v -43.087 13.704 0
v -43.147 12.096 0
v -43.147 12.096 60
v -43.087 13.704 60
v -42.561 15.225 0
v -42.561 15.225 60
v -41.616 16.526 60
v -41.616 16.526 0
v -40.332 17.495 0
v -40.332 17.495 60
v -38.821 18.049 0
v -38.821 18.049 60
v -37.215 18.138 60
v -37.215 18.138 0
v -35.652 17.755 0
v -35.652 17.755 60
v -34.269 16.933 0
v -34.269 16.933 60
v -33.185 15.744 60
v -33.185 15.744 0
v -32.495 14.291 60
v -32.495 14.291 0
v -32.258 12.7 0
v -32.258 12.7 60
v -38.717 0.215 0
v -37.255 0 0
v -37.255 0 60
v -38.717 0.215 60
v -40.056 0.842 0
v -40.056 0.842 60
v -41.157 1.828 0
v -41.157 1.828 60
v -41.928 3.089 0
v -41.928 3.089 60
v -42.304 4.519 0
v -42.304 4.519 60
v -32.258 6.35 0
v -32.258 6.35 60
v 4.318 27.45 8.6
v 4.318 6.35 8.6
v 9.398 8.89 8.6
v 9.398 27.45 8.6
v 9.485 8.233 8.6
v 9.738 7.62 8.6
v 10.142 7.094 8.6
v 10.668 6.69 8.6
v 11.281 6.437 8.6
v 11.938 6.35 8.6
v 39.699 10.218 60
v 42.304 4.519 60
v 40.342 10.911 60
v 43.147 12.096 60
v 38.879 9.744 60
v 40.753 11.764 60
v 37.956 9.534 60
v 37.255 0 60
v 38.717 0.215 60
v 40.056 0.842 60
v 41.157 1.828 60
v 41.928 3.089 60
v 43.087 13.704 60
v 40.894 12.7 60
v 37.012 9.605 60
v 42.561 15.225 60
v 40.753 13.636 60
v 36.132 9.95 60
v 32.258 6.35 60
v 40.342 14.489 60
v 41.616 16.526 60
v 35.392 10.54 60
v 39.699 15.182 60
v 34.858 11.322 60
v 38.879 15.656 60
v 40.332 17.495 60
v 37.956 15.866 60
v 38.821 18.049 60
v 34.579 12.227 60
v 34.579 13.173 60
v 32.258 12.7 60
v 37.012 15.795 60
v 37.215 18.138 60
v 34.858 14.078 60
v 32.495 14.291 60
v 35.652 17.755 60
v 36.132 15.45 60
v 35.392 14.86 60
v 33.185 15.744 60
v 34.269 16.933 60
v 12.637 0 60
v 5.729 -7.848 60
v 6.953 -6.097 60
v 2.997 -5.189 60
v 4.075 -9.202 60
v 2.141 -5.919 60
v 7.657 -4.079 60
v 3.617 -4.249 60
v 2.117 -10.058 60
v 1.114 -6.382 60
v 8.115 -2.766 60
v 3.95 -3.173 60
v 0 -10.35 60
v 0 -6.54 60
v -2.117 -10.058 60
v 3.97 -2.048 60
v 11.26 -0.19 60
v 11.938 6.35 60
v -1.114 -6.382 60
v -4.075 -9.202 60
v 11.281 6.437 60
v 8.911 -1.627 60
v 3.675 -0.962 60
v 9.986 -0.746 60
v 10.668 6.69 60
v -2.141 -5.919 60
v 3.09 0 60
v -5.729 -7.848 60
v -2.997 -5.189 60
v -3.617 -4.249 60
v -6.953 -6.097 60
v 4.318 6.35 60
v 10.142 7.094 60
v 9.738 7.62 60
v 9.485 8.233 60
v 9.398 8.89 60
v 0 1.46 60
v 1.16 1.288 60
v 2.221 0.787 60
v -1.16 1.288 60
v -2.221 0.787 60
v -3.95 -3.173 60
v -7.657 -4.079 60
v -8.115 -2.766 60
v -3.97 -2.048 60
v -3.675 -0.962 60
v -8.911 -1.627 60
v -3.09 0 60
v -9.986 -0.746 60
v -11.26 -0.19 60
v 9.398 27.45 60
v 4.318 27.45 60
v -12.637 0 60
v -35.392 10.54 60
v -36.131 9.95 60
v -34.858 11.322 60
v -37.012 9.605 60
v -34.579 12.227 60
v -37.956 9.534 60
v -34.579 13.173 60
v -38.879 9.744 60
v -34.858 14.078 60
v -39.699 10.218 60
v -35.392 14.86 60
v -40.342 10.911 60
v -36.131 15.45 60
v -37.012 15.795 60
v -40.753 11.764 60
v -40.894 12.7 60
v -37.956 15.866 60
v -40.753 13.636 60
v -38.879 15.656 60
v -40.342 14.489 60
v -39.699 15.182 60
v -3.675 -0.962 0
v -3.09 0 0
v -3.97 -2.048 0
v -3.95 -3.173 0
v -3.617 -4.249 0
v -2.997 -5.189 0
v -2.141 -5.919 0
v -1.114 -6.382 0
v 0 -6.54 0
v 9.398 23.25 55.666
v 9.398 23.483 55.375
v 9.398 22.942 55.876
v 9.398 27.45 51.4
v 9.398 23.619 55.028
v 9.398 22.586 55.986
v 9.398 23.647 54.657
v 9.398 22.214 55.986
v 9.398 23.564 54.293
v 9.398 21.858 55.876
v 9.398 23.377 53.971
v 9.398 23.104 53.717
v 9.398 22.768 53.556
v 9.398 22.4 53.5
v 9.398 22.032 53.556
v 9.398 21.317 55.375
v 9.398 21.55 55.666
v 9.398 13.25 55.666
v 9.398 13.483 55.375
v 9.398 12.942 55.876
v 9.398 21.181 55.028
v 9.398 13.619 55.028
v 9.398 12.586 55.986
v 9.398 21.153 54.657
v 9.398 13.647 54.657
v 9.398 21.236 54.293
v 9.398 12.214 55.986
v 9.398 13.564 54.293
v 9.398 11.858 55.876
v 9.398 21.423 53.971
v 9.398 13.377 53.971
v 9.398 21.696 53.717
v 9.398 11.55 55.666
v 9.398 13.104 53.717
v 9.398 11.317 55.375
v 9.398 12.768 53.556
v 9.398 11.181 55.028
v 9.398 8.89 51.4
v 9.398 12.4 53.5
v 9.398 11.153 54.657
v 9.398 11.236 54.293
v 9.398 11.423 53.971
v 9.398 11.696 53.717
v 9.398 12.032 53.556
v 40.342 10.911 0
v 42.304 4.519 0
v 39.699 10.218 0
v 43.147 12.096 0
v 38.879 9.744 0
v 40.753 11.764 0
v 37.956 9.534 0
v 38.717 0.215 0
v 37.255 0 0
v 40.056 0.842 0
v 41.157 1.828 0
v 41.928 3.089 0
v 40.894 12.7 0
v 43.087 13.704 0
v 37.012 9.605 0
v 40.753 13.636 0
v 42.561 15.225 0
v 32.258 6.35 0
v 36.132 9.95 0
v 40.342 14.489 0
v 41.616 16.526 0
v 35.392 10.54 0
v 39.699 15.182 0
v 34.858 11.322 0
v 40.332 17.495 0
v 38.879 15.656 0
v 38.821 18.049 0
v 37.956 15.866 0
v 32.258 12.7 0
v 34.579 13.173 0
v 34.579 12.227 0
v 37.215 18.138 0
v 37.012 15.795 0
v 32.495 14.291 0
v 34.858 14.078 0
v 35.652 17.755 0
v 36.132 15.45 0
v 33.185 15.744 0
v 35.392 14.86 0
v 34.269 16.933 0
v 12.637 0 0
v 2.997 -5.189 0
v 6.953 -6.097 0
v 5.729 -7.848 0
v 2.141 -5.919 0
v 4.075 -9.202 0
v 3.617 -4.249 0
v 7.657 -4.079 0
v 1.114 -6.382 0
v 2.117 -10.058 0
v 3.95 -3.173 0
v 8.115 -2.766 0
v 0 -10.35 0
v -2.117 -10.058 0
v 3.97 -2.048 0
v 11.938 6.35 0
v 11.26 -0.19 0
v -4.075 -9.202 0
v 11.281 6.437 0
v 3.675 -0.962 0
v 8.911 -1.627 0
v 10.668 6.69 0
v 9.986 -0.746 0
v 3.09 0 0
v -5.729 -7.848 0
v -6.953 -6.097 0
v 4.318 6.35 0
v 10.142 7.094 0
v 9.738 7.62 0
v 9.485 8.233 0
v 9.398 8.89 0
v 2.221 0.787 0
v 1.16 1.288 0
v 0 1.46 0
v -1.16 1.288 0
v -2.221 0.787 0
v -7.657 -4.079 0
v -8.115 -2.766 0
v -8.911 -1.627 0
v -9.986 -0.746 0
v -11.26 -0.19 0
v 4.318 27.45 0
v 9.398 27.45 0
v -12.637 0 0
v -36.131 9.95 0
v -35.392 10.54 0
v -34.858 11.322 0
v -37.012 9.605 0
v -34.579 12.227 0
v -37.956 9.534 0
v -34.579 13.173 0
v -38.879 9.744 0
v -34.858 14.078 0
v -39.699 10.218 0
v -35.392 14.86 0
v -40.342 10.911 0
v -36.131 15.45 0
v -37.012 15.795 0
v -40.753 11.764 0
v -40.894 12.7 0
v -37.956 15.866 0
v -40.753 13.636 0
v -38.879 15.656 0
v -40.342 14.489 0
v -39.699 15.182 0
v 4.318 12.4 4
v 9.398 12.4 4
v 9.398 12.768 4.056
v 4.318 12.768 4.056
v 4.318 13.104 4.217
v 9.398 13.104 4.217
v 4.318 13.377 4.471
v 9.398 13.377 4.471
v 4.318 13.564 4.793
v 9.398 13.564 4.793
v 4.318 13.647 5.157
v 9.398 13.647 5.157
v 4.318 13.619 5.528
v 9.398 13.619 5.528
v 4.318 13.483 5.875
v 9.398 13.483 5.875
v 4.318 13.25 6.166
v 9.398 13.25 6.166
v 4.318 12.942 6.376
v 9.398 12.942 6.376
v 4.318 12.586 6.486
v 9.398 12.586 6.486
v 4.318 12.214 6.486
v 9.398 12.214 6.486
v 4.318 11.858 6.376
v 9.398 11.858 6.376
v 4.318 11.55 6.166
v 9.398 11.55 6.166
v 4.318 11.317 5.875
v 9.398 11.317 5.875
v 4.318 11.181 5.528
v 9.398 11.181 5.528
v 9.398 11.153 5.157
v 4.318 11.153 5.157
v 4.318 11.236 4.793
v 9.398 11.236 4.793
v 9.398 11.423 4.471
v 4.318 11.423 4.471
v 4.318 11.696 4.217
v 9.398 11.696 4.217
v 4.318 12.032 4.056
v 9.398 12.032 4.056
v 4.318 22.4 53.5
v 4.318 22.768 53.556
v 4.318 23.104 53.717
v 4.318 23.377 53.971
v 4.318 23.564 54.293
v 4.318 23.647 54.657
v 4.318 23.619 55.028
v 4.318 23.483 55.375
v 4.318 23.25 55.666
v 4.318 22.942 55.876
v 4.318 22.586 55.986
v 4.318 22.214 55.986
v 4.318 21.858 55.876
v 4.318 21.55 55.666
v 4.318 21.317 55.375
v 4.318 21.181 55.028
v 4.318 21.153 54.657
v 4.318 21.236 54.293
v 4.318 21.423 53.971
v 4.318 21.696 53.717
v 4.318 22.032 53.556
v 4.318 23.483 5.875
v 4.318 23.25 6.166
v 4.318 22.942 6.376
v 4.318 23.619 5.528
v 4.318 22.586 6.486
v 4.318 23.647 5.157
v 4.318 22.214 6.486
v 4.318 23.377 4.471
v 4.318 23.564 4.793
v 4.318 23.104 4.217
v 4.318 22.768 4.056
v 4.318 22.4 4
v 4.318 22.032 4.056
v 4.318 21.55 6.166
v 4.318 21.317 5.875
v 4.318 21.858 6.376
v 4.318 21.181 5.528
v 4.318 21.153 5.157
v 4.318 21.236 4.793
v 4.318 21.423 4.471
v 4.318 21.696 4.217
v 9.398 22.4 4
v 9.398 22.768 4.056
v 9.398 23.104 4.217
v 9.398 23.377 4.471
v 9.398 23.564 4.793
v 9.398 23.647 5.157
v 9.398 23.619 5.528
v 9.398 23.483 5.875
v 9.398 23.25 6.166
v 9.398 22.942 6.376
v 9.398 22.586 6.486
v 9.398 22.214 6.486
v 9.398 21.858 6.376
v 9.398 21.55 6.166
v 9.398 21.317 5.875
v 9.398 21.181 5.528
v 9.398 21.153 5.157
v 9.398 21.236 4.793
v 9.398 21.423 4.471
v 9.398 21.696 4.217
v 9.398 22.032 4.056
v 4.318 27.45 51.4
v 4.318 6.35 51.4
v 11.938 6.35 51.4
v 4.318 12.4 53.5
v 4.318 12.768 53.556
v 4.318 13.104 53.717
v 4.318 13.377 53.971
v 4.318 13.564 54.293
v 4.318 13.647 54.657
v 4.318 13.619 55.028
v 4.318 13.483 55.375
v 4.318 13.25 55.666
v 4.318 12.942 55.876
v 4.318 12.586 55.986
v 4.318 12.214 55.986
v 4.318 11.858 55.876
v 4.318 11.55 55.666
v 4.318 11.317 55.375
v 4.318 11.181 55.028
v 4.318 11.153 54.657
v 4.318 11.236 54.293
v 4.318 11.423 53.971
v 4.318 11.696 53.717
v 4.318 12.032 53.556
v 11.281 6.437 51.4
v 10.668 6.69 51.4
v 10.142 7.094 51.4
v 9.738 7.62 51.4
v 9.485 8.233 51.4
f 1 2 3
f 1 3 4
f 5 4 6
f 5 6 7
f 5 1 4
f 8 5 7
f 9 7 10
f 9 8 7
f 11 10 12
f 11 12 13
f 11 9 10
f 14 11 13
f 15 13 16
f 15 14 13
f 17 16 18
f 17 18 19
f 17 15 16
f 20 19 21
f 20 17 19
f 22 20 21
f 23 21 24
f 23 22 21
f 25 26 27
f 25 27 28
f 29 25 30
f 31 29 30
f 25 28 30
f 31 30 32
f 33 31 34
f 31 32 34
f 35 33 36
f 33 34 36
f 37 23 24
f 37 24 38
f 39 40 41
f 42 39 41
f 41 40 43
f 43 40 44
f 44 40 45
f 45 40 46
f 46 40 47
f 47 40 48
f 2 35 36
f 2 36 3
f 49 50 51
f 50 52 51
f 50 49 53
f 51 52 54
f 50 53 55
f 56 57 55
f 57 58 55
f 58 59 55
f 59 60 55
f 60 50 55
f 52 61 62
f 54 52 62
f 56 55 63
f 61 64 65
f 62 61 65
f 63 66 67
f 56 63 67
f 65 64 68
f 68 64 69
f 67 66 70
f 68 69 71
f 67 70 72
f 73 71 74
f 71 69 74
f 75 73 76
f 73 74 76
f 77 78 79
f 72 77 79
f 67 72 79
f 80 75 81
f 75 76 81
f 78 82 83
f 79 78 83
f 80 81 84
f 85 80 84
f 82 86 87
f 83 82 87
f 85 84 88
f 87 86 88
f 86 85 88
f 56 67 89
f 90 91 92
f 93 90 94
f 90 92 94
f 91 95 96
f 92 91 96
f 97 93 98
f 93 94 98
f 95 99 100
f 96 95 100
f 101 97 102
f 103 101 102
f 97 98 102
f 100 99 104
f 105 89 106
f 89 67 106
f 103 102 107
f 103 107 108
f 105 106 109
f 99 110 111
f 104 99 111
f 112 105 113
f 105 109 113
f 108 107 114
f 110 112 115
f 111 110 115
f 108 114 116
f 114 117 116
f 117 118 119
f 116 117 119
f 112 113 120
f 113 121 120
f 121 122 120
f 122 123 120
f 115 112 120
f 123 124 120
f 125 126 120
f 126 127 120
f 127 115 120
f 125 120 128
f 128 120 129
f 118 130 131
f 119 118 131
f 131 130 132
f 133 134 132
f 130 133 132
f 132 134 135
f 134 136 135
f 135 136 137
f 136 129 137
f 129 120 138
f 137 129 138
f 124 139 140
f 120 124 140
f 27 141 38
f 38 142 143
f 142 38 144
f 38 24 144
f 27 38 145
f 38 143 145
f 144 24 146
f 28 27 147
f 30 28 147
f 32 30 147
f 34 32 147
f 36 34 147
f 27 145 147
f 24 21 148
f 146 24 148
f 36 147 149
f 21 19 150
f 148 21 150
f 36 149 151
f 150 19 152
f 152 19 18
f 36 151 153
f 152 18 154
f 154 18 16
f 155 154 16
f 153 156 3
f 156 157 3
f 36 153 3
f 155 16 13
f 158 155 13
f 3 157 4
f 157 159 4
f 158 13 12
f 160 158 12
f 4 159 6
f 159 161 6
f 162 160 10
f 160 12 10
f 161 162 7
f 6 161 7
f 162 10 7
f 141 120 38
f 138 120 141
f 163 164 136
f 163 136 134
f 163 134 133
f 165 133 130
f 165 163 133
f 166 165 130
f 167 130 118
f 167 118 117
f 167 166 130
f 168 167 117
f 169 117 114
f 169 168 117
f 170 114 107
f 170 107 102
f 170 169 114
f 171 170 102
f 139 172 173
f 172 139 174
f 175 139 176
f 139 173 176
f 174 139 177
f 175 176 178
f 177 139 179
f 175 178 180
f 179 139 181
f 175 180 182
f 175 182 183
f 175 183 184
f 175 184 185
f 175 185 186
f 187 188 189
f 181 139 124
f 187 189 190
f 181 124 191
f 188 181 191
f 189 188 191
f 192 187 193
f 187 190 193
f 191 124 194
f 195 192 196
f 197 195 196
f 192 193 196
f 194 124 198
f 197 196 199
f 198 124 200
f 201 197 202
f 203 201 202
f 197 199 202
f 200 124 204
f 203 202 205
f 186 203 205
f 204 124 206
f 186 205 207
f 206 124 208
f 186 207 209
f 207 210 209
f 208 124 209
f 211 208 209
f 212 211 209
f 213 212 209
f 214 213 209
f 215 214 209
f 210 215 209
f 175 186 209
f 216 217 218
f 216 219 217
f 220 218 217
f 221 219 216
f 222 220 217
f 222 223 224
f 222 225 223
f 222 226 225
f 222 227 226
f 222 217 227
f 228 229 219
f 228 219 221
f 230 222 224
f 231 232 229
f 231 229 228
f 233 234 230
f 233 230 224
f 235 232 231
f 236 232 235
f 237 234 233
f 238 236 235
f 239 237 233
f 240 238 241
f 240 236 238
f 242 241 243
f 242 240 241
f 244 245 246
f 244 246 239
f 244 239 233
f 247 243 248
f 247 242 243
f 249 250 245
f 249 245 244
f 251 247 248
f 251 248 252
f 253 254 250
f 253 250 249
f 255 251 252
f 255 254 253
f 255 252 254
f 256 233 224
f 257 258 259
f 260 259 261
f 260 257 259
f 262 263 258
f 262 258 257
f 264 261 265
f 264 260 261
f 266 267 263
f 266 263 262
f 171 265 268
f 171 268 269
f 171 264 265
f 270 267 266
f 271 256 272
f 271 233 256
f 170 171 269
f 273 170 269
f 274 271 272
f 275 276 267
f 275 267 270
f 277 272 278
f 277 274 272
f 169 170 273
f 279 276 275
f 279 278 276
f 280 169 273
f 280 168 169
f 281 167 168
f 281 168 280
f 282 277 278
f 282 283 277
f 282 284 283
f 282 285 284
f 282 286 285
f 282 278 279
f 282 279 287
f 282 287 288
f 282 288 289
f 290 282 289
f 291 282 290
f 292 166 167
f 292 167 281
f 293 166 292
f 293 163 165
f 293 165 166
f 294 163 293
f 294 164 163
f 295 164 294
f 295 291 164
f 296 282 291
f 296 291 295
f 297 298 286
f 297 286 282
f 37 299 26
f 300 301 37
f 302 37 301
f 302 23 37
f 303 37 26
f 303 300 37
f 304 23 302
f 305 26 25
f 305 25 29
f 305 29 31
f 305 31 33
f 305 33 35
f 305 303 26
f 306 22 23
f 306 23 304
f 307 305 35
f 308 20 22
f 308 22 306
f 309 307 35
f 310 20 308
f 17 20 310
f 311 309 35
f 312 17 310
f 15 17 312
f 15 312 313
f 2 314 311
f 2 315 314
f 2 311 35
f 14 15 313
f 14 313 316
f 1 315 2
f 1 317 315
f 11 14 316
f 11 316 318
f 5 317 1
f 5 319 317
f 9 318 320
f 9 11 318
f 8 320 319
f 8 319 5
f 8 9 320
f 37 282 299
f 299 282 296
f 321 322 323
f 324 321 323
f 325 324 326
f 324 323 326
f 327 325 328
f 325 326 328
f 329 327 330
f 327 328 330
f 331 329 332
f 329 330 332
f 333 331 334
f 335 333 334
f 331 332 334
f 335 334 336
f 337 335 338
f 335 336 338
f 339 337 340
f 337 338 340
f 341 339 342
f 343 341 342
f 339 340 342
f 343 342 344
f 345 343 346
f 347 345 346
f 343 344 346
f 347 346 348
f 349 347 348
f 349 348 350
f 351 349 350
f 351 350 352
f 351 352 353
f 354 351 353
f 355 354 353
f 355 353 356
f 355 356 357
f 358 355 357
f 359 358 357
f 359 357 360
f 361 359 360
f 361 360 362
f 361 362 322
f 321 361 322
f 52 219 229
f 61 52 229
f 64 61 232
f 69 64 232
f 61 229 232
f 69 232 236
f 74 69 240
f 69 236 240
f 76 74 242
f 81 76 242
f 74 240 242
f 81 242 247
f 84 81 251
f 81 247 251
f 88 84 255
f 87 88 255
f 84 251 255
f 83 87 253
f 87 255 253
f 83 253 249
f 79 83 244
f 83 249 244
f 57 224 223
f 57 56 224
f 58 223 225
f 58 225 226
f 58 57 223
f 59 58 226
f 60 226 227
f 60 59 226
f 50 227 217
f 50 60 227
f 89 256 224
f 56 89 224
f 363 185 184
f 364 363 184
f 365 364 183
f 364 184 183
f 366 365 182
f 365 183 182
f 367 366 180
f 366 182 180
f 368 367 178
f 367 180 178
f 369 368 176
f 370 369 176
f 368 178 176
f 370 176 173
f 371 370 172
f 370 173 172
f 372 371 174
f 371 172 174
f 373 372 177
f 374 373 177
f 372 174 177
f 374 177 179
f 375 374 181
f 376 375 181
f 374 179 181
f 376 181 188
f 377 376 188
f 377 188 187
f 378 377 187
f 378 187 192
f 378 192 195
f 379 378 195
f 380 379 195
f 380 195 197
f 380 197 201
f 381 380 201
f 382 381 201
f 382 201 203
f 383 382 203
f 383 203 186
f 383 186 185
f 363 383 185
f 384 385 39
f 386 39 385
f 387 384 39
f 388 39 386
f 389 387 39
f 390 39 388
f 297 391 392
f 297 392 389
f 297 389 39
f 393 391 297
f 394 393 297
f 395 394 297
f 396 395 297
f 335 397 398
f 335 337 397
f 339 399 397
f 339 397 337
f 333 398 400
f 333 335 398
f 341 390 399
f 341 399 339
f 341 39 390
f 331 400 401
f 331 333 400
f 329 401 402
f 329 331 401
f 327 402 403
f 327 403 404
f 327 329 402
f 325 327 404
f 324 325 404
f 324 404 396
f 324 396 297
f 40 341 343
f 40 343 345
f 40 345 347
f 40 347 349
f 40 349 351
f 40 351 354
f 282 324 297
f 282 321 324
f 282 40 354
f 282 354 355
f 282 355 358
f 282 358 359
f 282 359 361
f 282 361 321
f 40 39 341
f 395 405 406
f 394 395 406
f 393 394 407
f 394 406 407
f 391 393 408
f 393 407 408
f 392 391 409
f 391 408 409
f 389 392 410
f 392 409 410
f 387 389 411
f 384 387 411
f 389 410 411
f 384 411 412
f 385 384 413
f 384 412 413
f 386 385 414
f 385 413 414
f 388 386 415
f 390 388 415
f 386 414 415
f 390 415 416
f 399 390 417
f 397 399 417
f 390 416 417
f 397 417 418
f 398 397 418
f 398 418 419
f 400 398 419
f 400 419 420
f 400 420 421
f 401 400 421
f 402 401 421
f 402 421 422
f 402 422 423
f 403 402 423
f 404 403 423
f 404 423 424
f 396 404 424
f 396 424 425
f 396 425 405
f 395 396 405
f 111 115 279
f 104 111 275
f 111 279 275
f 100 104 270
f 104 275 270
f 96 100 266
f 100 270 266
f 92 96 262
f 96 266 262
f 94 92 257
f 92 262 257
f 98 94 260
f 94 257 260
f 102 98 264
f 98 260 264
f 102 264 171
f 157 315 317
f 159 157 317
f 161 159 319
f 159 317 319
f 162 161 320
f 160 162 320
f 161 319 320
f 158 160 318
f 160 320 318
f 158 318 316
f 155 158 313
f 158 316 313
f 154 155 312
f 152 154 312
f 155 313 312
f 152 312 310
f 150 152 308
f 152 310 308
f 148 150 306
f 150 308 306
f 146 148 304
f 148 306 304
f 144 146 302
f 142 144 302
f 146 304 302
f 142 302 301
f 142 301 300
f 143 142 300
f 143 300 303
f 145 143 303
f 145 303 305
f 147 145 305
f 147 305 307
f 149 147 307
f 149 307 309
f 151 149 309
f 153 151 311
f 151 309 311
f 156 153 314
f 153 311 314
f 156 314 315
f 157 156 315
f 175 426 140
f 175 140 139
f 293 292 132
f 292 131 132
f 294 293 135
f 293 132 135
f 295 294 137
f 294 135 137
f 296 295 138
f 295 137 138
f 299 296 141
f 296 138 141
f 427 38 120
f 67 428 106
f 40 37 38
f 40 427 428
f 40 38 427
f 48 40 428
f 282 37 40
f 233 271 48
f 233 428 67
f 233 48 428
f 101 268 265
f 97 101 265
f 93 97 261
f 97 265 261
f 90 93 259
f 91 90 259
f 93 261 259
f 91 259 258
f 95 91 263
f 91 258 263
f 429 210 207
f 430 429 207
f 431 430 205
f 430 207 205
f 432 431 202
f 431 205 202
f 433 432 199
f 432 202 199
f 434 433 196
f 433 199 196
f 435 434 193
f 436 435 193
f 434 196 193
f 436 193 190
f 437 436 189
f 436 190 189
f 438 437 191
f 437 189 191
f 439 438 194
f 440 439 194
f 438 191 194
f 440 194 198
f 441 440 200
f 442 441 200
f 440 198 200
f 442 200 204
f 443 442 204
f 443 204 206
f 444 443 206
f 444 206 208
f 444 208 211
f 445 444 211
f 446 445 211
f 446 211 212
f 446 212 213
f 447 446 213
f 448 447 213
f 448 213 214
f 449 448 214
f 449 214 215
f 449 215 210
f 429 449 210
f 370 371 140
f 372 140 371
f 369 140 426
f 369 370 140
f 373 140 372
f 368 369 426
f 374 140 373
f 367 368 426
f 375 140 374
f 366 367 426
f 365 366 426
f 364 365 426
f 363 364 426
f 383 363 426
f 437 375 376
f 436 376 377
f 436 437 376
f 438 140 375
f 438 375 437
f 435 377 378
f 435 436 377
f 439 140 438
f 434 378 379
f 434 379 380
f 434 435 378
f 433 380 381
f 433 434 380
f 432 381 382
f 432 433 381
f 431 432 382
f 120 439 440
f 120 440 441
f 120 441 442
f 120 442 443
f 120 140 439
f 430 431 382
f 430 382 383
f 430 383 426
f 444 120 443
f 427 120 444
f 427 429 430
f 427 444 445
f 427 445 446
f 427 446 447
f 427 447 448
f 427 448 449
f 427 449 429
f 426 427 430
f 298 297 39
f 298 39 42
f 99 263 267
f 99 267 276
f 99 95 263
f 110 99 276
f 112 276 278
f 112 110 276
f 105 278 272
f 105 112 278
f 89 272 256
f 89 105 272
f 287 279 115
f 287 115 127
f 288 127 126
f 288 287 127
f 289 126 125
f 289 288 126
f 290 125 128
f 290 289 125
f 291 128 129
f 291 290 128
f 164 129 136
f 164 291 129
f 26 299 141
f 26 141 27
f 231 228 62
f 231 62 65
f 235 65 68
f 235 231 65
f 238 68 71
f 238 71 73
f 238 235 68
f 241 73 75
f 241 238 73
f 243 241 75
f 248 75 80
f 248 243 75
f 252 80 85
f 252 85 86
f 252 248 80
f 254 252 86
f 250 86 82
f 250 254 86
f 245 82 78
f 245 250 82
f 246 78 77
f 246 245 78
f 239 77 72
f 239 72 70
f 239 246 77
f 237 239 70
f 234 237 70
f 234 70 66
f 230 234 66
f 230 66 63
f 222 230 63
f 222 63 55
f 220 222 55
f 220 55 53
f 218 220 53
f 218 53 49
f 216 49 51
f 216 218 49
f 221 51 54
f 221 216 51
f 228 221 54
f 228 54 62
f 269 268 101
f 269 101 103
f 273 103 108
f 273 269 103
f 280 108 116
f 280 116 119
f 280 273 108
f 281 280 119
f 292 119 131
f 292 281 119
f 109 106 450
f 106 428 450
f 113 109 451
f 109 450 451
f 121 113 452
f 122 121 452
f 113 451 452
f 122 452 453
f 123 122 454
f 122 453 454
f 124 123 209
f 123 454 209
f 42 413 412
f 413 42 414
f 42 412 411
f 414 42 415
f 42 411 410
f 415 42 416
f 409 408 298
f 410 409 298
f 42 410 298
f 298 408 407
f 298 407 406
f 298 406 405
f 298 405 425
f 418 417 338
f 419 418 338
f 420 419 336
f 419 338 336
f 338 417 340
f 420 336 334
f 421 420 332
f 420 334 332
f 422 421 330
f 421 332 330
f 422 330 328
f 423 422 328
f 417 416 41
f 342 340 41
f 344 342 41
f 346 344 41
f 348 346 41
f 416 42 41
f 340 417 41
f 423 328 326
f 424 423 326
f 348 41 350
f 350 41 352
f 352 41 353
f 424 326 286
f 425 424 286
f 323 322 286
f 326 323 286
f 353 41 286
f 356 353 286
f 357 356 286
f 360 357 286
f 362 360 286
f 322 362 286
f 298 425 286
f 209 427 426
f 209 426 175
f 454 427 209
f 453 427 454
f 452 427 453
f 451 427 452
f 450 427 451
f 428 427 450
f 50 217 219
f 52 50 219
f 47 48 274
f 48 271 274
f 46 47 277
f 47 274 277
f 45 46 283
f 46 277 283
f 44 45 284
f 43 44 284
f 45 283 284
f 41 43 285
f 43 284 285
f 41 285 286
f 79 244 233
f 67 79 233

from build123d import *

# Parameters (mm, degrees)
SKETCH1_R           = 3.175
BOSS_EXTRUDE1_DEPTH = 60
SKETCH2_R           = 4
CUT_EXTRUDE1_DEPTH  = 61
BOSS_EXTRUDE2_DEPTH = 60
SKETCH5_W           = 5.08
SKETCH5_H           = 8.6
BOSS_EXTRUDE3_DEPTH = 21.1
CUT_EXTRUDE2_REACH  = 54.578
SKETCH6_R           = 1.25
FILLET1_R           = 2.54
FILLET3_R           = 5.08
FILLET4_R           = 5.08


with BuildPart() as part:
    # Sketch1 → Boss-Extrude1 (new body)
    with BuildSketch(Plane.XY):
        with BuildLine():
            Line((0, 0), (41.801331845, 0))
            Line((41.801331845, 0), (43.146541753, 12.096417759))
            ThreePointArc((43.146541753, 12.096417759), (38.021254436, 18.152629022), (32.258, 12.7))
            Line((32.258, 12.7), (32.258, 6.35))
            Line((32.258, 6.35), (0, 6.35))
            Line((0, 6.35), (0, 0))
        make_face()
        with Locations((37.719, 12.7)):
            Circle(SKETCH1_R, mode=Mode.SUBTRACT)
    boss_extrude1 = extrude(amount=BOSS_EXTRUDE1_DEPTH)

    # Sketch2 → Cut-Extrude1 (cut, through all)
    with BuildSketch(Plane(origin=(0, 0, 0), x_dir=(-1, 0, 0), z_dir=(0, 0, -1))):
        with Locations((0, -2.54)):
            Circle(SKETCH2_R)
    cut_extrude1 = extrude(amount=-CUT_EXTRUDE1_DEPTH, mode=Mode.SUBTRACT)

    # Sketch3 → Boss-Extrude2 (add)
    with BuildSketch(Plane(origin=(0, 0, 0), x_dir=(-1, 0, 0), z_dir=(0, 0, -1))):
        with BuildLine():
            Line((-7.385424835, 0), (-3.090048543, 0))
            ThreePointArc((-3.090048543, 0), (-3.616628264, -4.248800749), (0, -6.54))
            Line((0, -6.54), (0, -10.35))
            ThreePointArc((0, -10.35), (-6.357416928, -7.076446847), (-7.385424835, 0))
        make_face()
    boss_extrude2 = extrude(amount=-BOSS_EXTRUDE2_DEPTH)

    # Mirror1: Boss-Extrude1, Cut-Extrude1, Boss-Extrude2 across plane
    add(boss_extrude1.mirror(Plane(origin=(0, 0, 0), x_dir=(0, 0, 1), z_dir=(1, 0, 0))))
    add(cut_extrude1.mirror(Plane(origin=(0, 0, 0), x_dir=(0, 0, 1), z_dir=(1, 0, 0))), mode=Mode.SUBTRACT)
    add(boss_extrude2.mirror(Plane(origin=(0, 0, 0), x_dir=(0, 0, 1), z_dir=(1, 0, 0))))

    # Sketch5 → Boss-Extrude3 (add)
    with BuildSketch(Plane(origin=(0, 6.35, 0), x_dir=(1, 0, 0), z_dir=(0, 1, 0))):
        with Locations((6.858, -4.3)):
            Rectangle(SKETCH5_W, SKETCH5_H)
        with Locations((6.858, -55.7)):
            Rectangle(SKETCH5_W, SKETCH5_H)
    extrude(amount=BOSS_EXTRUDE3_DEPTH)

    # Sketch6 → Cut-Extrude2 (cut, up to next)
    with BuildSketch(Plane(origin=(9.398, 0, 0), x_dir=(0, 0, -1), z_dir=(1, 0, 0)), mode=Mode.PRIVATE) as cut_extrude2_sk1:
        with Locations((-54.75, 22.4)):
            Circle(SKETCH6_R)
    cut_extrude2_tool1 = extrude(cut_extrude2_sk1.sketch, amount=-CUT_EXTRUDE2_REACH, mode=Mode.PRIVATE) & part.part
    add(cut_extrude2_tool1.solids().sort_by_distance((9.398, 22.4, 54.75))[0], mode=Mode.SUBTRACT)
    # Sketch6 → Cut-Extrude2 (cut, up to next)
    with BuildSketch(Plane(origin=(9.398, 0, 0), x_dir=(0, 0, -1), z_dir=(1, 0, 0)), mode=Mode.PRIVATE) as cut_extrude2_sk2:
        with Locations((-5.25, 22.4)):
            Circle(SKETCH6_R)
    cut_extrude2_tool2 = extrude(cut_extrude2_sk2.sketch, amount=-CUT_EXTRUDE2_REACH, mode=Mode.PRIVATE) & part.part
    add(cut_extrude2_tool2.solids().sort_by_distance((9.398, 22.4, 5.25))[0], mode=Mode.SUBTRACT)
    # Sketch6 → Cut-Extrude2 (cut, up to next)
    with BuildSketch(Plane(origin=(9.398, 0, 0), x_dir=(0, 0, -1), z_dir=(1, 0, 0)), mode=Mode.PRIVATE) as cut_extrude2_sk3:
        with Locations((-5.25, 12.4)):
            Circle(SKETCH6_R)
    cut_extrude2_tool3 = extrude(cut_extrude2_sk3.sketch, amount=-CUT_EXTRUDE2_REACH, mode=Mode.PRIVATE) & part.part
    add(cut_extrude2_tool3.solids().sort_by_distance((9.398, 12.4, 5.25))[0], mode=Mode.SUBTRACT)
    # Sketch6 → Cut-Extrude2 (cut, up to next)
    with BuildSketch(Plane(origin=(9.398, 0, 0), x_dir=(0, 0, -1), z_dir=(1, 0, 0)), mode=Mode.PRIVATE) as cut_extrude2_sk4:
        with Locations((-54.75, 12.4)):
            Circle(SKETCH6_R)
    cut_extrude2_tool4 = extrude(cut_extrude2_sk4.sketch, amount=-CUT_EXTRUDE2_REACH, mode=Mode.PRIVATE) & part.part
    add(cut_extrude2_tool4.solids().sort_by_distance((9.398, 12.4, 54.75))[0], mode=Mode.SUBTRACT)

    # Fillet1
    fillet1_edges = [part.edges().sort_by_distance(p)[0] for p in [
        (9.398, 6.35, 55.7),
        (9.398, 6.35, 4.3),
    ]]
    fillet(fillet1_edges, radius=FILLET1_R)

    # Fillet3
    fillet3_edges = [part.edges().sort_by_distance(p)[0] for p in [
        (7.385424835, 0, 30),
        (-7.385424835, 0, 30),
    ]]
    fillet(fillet3_edges, radius=FILLET3_R)

    # Fillet4
    fillet4_edges = [part.edges().sort_by_distance(p)[0] for p in [
        (41.801331845, 0, 30),
        (-41.801331845, 0, 30),
    ]]
    fillet(fillet4_edges, radius=FILLET4_R)


solid = part.part
